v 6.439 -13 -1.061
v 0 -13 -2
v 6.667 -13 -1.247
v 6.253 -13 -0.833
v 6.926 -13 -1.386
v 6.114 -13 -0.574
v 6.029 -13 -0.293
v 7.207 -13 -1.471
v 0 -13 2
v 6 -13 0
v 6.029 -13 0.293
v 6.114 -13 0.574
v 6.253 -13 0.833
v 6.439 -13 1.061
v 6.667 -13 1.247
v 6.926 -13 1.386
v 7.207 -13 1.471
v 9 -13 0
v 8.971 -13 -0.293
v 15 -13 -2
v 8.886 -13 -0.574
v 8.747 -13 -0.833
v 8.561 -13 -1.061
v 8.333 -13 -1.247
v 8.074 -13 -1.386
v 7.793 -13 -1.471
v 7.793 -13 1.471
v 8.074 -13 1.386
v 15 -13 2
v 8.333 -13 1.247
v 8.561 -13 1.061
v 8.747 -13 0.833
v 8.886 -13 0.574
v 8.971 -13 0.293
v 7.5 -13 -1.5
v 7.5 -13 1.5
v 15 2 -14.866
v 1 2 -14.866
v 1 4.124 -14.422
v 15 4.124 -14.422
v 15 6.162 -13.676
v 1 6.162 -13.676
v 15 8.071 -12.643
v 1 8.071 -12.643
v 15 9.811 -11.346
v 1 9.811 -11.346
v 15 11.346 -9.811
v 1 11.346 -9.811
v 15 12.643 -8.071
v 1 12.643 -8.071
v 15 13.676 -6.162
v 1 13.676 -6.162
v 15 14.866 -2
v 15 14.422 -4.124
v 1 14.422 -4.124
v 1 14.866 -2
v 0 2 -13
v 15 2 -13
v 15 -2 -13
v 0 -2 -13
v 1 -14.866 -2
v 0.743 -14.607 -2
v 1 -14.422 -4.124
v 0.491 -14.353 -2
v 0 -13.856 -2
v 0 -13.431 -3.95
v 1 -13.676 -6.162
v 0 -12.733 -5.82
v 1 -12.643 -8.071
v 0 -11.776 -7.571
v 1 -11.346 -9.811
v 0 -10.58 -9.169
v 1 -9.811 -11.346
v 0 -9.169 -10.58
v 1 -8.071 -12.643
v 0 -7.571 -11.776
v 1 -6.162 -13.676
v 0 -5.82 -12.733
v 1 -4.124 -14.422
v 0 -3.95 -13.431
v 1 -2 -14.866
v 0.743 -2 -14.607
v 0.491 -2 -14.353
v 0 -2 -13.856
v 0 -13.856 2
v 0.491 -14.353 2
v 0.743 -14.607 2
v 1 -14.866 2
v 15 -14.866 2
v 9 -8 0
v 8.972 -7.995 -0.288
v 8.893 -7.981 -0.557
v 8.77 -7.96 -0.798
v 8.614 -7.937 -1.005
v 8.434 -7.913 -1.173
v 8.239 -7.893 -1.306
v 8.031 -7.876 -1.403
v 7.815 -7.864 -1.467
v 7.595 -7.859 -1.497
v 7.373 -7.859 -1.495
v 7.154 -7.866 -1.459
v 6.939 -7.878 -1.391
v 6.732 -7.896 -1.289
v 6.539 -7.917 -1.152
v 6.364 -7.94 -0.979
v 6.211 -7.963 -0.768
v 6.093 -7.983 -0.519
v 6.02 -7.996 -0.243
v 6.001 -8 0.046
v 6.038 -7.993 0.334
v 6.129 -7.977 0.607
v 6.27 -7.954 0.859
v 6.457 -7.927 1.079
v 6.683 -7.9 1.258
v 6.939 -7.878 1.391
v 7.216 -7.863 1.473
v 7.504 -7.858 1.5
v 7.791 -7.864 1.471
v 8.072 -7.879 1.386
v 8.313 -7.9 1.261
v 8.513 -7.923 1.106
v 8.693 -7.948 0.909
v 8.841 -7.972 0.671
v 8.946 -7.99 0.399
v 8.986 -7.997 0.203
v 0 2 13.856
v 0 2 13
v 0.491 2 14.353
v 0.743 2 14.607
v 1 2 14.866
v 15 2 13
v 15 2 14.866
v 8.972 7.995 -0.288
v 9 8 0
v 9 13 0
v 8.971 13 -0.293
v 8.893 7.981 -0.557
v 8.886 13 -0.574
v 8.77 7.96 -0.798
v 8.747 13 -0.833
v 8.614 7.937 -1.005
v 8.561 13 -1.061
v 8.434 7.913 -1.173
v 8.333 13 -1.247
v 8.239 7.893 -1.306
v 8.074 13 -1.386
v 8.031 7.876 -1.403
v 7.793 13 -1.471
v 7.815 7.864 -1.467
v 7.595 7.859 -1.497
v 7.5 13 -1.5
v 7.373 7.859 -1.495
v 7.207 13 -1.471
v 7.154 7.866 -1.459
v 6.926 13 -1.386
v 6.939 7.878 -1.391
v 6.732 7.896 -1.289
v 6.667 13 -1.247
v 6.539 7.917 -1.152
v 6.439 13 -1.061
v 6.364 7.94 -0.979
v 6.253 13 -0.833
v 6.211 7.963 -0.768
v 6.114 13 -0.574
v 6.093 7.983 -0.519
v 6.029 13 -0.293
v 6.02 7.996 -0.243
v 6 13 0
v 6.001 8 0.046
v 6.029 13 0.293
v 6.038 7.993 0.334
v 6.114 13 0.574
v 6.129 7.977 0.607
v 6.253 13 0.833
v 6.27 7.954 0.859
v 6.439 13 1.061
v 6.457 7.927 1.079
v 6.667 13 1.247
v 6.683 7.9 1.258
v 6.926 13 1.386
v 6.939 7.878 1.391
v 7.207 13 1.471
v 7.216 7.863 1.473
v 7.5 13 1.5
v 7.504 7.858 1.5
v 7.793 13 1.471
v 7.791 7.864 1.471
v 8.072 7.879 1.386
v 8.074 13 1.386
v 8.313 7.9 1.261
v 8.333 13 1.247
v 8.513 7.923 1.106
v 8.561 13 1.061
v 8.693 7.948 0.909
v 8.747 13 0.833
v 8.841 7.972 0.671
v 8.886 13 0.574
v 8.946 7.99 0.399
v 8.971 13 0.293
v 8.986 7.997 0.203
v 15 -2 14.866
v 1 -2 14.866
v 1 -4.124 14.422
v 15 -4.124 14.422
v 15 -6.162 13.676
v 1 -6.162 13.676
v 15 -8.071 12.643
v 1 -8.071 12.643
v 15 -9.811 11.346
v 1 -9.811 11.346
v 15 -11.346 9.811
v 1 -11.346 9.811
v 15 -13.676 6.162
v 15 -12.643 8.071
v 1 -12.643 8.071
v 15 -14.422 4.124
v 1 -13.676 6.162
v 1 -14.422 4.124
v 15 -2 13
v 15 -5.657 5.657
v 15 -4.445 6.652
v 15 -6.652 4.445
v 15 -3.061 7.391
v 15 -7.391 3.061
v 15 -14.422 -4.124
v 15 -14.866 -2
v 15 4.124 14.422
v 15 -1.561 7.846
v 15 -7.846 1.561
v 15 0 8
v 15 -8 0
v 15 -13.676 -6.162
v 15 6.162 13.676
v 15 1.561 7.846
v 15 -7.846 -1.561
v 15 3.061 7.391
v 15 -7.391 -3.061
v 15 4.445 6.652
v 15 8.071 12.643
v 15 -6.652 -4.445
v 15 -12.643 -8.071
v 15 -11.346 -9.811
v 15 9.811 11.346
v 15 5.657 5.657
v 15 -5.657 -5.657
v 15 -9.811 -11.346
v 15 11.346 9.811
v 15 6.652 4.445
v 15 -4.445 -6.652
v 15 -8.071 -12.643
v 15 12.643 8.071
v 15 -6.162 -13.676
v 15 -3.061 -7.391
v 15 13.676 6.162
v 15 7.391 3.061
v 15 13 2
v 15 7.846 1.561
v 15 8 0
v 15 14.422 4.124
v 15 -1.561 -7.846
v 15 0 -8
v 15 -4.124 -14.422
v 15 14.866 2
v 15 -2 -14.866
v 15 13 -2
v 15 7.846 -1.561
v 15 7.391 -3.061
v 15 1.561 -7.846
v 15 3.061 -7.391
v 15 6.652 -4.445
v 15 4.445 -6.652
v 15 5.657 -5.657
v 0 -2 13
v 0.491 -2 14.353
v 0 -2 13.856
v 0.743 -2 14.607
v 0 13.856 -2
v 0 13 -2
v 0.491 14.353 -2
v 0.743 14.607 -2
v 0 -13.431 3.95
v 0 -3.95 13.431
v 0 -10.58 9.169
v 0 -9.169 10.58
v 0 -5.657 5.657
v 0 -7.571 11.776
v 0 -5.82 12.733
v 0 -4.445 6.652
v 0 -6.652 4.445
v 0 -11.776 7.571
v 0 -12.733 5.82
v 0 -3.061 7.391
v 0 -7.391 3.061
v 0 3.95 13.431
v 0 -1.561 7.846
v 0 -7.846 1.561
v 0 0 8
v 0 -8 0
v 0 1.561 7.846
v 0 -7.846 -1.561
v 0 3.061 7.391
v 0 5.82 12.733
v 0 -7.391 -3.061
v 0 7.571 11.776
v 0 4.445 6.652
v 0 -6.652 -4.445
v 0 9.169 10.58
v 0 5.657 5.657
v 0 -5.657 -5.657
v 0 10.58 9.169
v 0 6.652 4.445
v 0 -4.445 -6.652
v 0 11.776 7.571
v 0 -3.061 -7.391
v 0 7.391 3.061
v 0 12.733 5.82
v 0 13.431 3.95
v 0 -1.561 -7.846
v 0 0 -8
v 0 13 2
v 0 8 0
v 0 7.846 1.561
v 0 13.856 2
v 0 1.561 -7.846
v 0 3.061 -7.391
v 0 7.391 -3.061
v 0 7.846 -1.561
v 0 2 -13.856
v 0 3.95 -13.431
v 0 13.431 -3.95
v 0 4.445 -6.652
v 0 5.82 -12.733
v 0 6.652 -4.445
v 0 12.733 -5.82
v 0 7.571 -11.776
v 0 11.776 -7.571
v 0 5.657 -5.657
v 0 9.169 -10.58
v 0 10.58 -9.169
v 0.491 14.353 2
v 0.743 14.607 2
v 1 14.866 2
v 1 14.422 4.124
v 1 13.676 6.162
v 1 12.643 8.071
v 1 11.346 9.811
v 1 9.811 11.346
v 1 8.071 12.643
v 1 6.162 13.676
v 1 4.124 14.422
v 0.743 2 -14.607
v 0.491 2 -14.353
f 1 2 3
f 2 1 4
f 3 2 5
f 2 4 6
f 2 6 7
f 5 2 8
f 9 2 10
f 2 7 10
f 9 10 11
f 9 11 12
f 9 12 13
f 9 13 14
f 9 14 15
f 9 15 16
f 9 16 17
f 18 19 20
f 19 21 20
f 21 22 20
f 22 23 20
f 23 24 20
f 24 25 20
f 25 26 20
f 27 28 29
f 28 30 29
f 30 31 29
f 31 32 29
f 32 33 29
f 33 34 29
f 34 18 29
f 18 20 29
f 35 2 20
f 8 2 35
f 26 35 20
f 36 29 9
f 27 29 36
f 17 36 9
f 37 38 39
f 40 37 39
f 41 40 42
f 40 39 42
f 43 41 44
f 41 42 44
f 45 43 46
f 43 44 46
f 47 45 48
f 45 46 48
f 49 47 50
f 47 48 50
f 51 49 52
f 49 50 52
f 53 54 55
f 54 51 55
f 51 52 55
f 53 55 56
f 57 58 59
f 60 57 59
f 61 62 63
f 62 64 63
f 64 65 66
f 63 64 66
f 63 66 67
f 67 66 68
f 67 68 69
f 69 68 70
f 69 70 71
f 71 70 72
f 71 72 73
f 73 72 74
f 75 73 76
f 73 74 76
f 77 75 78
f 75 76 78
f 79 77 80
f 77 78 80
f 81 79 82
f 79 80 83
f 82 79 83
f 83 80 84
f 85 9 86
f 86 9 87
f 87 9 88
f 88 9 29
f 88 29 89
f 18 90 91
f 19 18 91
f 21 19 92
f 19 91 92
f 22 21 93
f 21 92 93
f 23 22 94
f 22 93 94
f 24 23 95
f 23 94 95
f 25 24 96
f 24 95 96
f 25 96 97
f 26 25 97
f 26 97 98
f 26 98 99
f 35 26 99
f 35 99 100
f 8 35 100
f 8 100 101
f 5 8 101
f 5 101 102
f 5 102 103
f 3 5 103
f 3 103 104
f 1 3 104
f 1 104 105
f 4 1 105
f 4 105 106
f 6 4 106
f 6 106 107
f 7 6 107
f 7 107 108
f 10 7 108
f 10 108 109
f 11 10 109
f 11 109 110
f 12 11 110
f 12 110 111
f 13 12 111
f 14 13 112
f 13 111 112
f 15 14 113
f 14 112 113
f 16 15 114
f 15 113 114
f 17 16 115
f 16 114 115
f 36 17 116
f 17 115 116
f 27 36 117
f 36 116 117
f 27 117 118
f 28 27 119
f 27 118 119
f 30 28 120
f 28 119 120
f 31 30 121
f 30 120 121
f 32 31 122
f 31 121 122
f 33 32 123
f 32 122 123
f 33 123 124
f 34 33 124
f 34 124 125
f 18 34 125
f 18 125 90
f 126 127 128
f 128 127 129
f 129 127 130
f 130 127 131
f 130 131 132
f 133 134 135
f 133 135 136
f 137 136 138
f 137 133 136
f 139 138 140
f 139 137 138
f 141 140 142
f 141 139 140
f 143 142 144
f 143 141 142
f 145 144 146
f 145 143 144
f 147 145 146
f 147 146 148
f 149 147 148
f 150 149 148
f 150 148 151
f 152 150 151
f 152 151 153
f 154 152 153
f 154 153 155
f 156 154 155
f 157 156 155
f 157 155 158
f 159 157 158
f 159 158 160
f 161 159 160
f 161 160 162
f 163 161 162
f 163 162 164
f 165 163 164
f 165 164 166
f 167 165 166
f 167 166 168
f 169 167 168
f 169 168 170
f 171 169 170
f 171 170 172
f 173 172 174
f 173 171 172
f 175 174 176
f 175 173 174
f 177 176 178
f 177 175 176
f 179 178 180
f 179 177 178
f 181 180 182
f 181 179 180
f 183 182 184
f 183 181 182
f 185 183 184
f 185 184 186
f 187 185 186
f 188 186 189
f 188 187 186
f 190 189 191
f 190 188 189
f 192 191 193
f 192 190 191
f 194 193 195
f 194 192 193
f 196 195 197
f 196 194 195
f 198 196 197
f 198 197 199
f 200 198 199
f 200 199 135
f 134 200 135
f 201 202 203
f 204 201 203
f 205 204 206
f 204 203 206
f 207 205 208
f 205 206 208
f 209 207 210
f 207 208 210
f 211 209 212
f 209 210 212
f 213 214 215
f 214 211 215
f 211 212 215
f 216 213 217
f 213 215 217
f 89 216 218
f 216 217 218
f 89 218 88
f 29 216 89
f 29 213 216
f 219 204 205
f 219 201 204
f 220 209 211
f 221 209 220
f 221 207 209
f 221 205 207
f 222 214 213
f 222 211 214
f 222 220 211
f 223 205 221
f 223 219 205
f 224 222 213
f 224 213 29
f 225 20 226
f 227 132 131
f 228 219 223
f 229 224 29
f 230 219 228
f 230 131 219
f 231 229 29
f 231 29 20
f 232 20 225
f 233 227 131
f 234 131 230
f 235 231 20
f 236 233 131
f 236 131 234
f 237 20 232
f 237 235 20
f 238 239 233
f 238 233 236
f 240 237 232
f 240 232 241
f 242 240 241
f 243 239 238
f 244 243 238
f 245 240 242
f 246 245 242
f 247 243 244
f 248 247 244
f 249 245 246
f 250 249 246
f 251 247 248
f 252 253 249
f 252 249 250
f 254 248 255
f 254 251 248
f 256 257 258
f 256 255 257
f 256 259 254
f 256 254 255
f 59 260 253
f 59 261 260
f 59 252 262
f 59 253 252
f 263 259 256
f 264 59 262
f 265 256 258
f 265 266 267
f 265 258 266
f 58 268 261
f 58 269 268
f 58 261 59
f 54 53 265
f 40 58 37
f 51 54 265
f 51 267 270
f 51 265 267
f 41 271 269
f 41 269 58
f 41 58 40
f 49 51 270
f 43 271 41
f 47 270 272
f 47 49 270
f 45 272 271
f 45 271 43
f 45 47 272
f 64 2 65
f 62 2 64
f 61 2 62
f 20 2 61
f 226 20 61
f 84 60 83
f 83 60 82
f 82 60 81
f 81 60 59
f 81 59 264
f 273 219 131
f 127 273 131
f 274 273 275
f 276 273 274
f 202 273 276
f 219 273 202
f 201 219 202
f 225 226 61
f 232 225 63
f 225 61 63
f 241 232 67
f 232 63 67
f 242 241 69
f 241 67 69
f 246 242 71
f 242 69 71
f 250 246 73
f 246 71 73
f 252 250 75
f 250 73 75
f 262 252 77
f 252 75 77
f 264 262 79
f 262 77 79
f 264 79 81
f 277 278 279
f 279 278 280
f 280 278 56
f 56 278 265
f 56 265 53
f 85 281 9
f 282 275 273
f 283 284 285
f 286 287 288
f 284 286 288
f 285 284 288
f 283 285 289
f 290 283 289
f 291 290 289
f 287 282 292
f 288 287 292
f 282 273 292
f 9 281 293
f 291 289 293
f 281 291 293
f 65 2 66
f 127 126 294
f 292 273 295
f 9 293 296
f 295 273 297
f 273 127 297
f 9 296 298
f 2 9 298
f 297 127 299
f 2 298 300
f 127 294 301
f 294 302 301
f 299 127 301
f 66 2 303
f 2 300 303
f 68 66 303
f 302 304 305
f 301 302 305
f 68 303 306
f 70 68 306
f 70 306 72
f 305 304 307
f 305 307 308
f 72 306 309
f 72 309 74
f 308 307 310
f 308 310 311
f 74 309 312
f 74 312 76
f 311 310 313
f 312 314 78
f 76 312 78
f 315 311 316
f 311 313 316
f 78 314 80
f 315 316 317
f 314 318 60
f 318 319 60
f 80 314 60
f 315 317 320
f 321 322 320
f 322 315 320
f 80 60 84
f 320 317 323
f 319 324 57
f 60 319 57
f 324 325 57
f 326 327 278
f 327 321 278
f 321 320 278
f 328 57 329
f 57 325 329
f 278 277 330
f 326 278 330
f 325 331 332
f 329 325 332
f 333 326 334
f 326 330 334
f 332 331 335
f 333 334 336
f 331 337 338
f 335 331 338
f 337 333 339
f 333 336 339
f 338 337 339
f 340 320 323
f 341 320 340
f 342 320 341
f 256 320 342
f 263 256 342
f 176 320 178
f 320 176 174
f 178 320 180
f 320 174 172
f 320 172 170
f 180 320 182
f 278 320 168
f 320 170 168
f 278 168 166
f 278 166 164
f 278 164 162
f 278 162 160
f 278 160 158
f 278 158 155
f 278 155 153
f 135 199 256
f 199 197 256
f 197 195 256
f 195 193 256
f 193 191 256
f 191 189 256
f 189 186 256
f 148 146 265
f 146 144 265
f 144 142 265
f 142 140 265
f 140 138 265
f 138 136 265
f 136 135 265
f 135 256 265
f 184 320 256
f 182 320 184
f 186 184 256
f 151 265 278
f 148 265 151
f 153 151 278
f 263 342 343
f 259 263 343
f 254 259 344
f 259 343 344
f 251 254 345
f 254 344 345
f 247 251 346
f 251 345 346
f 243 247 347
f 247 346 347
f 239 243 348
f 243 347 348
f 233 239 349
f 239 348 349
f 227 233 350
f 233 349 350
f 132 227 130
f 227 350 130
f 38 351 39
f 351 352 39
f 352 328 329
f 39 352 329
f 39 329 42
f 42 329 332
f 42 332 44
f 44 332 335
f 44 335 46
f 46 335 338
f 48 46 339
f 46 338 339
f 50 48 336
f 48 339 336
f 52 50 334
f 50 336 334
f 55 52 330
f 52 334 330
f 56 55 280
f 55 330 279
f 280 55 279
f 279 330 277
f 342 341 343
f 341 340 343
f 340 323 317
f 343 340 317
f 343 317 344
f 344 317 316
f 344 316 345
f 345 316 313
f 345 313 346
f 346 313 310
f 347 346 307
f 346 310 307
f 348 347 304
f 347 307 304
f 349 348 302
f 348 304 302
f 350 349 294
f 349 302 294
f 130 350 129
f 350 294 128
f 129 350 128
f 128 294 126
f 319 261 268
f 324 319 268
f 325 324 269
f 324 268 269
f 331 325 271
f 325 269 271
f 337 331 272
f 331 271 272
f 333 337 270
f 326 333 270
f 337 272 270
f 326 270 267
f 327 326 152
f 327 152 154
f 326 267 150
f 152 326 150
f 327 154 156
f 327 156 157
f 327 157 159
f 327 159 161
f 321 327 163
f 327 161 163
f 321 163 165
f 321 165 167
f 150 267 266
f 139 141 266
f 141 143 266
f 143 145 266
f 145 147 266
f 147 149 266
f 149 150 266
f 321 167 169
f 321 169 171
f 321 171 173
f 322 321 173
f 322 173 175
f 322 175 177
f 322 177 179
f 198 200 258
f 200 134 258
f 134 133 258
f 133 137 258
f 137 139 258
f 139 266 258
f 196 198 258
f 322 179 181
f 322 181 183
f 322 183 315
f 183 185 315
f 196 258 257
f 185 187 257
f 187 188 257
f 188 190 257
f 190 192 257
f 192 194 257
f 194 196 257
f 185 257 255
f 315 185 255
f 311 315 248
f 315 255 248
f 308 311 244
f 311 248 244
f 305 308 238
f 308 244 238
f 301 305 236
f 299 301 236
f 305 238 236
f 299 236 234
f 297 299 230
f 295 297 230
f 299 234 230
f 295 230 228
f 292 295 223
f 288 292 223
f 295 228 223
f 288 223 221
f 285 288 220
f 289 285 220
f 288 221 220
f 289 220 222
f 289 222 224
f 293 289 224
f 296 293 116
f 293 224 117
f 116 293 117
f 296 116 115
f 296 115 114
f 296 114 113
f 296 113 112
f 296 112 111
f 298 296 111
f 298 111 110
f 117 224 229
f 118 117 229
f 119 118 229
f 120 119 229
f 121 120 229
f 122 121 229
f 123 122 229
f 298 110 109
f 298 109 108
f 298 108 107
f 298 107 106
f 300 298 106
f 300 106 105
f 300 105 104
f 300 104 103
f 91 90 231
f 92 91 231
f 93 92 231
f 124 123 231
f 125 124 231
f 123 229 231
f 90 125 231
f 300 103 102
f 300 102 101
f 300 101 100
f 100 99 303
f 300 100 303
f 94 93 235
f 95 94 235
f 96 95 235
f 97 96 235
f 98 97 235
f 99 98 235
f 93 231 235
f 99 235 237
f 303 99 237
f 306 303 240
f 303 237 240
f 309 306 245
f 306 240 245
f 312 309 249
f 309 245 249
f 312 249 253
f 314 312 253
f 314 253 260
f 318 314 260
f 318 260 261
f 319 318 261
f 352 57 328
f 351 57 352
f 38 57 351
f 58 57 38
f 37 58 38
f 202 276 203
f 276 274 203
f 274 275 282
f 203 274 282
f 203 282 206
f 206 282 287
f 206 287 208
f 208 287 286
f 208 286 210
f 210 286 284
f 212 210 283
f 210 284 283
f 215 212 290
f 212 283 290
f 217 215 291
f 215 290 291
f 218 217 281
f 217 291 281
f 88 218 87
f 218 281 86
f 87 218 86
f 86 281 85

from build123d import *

# Parameters (mm, degrees)
SKETCH1_R               = 15
BOSS_EXTRUDE1_DEPTH     = 15
SKETCH2_R               = 8
CUT_EXTRUDE1_DEPTH      = 16
CHAMFER1_SIZE           = 1
SKETCH3_W               = 4
SKETCH3_H               = 4
CUT_EXTRUDE2_DEPTH      = 16
CIRPATTERN1_COUNT       = 4
SKETCH4_R               = 1.5
CUT_EXTRUDE4_DEPTH      = 18
CUT_EXTRUDE4_DEPTH_BACK = 15.866068747


with BuildPart() as part:
    # Sketch1 → Boss-Extrude1 (new body)
    with BuildSketch(Plane(origin=(0, 0, 0), x_dir=(0, 0, -1), z_dir=(1, 0, 0))):
        Circle(SKETCH1_R)
    extrude(amount=BOSS_EXTRUDE1_DEPTH)

    # Sketch2 → Cut-Extrude1 (cut, through all)
    with BuildSketch(Plane(origin=(15, 0, 0), x_dir=(0, 0, -1), z_dir=(1, 0, 0))):
        Circle(SKETCH2_R)
    extrude(amount=-CUT_EXTRUDE1_DEPTH, mode=Mode.SUBTRACT)

    # Chamfer1
    chamfer1_edges = [part.edges().sort_by_distance(p)[0] for p in [
        (0, 0, 15),
    ]]
    chamfer(chamfer1_edges, length=CHAMFER1_SIZE)

    # Sketch3 → Cut-Extrude2 (cut, through all)
    with BuildSketch(Plane(origin=(15, 0, 0), x_dir=(0, 0, -1), z_dir=(1, 0, 0))):
        with Locations((0, 15)):
            Rectangle(SKETCH3_W, SKETCH3_H)
    cut_extrude2 = extrude(amount=-CUT_EXTRUDE2_DEPTH, mode=Mode.SUBTRACT)

    # CirPattern1: Cut-Extrude2 ×4 about axis
    cirpattern1_axis = Axis((0, 0, 0), (1, 0, 0))
    for i in range(1, CIRPATTERN1_COUNT):
        add(cut_extrude2.rotate(cirpattern1_axis, i * 360 / CIRPATTERN1_COUNT), mode=Mode.SUBTRACT)

    # Sketch4 → Cut-Extrude4 (cut, two sides)
    with BuildSketch(Plane(origin=(0, 0, 0), x_dir=(1, 0, 0), z_dir=(0, 1, 0))) as cut_extrude4_sk:
        with Locations((7.5, 0)):
            Circle(SKETCH4_R)
    extrude(amount=CUT_EXTRUDE4_DEPTH, mode=Mode.SUBTRACT)
    extrude(cut_extrude4_sk.sketch, amount=-CUT_EXTRUDE4_DEPTH_BACK, mode=Mode.SUBTRACT)


solid = part.part
